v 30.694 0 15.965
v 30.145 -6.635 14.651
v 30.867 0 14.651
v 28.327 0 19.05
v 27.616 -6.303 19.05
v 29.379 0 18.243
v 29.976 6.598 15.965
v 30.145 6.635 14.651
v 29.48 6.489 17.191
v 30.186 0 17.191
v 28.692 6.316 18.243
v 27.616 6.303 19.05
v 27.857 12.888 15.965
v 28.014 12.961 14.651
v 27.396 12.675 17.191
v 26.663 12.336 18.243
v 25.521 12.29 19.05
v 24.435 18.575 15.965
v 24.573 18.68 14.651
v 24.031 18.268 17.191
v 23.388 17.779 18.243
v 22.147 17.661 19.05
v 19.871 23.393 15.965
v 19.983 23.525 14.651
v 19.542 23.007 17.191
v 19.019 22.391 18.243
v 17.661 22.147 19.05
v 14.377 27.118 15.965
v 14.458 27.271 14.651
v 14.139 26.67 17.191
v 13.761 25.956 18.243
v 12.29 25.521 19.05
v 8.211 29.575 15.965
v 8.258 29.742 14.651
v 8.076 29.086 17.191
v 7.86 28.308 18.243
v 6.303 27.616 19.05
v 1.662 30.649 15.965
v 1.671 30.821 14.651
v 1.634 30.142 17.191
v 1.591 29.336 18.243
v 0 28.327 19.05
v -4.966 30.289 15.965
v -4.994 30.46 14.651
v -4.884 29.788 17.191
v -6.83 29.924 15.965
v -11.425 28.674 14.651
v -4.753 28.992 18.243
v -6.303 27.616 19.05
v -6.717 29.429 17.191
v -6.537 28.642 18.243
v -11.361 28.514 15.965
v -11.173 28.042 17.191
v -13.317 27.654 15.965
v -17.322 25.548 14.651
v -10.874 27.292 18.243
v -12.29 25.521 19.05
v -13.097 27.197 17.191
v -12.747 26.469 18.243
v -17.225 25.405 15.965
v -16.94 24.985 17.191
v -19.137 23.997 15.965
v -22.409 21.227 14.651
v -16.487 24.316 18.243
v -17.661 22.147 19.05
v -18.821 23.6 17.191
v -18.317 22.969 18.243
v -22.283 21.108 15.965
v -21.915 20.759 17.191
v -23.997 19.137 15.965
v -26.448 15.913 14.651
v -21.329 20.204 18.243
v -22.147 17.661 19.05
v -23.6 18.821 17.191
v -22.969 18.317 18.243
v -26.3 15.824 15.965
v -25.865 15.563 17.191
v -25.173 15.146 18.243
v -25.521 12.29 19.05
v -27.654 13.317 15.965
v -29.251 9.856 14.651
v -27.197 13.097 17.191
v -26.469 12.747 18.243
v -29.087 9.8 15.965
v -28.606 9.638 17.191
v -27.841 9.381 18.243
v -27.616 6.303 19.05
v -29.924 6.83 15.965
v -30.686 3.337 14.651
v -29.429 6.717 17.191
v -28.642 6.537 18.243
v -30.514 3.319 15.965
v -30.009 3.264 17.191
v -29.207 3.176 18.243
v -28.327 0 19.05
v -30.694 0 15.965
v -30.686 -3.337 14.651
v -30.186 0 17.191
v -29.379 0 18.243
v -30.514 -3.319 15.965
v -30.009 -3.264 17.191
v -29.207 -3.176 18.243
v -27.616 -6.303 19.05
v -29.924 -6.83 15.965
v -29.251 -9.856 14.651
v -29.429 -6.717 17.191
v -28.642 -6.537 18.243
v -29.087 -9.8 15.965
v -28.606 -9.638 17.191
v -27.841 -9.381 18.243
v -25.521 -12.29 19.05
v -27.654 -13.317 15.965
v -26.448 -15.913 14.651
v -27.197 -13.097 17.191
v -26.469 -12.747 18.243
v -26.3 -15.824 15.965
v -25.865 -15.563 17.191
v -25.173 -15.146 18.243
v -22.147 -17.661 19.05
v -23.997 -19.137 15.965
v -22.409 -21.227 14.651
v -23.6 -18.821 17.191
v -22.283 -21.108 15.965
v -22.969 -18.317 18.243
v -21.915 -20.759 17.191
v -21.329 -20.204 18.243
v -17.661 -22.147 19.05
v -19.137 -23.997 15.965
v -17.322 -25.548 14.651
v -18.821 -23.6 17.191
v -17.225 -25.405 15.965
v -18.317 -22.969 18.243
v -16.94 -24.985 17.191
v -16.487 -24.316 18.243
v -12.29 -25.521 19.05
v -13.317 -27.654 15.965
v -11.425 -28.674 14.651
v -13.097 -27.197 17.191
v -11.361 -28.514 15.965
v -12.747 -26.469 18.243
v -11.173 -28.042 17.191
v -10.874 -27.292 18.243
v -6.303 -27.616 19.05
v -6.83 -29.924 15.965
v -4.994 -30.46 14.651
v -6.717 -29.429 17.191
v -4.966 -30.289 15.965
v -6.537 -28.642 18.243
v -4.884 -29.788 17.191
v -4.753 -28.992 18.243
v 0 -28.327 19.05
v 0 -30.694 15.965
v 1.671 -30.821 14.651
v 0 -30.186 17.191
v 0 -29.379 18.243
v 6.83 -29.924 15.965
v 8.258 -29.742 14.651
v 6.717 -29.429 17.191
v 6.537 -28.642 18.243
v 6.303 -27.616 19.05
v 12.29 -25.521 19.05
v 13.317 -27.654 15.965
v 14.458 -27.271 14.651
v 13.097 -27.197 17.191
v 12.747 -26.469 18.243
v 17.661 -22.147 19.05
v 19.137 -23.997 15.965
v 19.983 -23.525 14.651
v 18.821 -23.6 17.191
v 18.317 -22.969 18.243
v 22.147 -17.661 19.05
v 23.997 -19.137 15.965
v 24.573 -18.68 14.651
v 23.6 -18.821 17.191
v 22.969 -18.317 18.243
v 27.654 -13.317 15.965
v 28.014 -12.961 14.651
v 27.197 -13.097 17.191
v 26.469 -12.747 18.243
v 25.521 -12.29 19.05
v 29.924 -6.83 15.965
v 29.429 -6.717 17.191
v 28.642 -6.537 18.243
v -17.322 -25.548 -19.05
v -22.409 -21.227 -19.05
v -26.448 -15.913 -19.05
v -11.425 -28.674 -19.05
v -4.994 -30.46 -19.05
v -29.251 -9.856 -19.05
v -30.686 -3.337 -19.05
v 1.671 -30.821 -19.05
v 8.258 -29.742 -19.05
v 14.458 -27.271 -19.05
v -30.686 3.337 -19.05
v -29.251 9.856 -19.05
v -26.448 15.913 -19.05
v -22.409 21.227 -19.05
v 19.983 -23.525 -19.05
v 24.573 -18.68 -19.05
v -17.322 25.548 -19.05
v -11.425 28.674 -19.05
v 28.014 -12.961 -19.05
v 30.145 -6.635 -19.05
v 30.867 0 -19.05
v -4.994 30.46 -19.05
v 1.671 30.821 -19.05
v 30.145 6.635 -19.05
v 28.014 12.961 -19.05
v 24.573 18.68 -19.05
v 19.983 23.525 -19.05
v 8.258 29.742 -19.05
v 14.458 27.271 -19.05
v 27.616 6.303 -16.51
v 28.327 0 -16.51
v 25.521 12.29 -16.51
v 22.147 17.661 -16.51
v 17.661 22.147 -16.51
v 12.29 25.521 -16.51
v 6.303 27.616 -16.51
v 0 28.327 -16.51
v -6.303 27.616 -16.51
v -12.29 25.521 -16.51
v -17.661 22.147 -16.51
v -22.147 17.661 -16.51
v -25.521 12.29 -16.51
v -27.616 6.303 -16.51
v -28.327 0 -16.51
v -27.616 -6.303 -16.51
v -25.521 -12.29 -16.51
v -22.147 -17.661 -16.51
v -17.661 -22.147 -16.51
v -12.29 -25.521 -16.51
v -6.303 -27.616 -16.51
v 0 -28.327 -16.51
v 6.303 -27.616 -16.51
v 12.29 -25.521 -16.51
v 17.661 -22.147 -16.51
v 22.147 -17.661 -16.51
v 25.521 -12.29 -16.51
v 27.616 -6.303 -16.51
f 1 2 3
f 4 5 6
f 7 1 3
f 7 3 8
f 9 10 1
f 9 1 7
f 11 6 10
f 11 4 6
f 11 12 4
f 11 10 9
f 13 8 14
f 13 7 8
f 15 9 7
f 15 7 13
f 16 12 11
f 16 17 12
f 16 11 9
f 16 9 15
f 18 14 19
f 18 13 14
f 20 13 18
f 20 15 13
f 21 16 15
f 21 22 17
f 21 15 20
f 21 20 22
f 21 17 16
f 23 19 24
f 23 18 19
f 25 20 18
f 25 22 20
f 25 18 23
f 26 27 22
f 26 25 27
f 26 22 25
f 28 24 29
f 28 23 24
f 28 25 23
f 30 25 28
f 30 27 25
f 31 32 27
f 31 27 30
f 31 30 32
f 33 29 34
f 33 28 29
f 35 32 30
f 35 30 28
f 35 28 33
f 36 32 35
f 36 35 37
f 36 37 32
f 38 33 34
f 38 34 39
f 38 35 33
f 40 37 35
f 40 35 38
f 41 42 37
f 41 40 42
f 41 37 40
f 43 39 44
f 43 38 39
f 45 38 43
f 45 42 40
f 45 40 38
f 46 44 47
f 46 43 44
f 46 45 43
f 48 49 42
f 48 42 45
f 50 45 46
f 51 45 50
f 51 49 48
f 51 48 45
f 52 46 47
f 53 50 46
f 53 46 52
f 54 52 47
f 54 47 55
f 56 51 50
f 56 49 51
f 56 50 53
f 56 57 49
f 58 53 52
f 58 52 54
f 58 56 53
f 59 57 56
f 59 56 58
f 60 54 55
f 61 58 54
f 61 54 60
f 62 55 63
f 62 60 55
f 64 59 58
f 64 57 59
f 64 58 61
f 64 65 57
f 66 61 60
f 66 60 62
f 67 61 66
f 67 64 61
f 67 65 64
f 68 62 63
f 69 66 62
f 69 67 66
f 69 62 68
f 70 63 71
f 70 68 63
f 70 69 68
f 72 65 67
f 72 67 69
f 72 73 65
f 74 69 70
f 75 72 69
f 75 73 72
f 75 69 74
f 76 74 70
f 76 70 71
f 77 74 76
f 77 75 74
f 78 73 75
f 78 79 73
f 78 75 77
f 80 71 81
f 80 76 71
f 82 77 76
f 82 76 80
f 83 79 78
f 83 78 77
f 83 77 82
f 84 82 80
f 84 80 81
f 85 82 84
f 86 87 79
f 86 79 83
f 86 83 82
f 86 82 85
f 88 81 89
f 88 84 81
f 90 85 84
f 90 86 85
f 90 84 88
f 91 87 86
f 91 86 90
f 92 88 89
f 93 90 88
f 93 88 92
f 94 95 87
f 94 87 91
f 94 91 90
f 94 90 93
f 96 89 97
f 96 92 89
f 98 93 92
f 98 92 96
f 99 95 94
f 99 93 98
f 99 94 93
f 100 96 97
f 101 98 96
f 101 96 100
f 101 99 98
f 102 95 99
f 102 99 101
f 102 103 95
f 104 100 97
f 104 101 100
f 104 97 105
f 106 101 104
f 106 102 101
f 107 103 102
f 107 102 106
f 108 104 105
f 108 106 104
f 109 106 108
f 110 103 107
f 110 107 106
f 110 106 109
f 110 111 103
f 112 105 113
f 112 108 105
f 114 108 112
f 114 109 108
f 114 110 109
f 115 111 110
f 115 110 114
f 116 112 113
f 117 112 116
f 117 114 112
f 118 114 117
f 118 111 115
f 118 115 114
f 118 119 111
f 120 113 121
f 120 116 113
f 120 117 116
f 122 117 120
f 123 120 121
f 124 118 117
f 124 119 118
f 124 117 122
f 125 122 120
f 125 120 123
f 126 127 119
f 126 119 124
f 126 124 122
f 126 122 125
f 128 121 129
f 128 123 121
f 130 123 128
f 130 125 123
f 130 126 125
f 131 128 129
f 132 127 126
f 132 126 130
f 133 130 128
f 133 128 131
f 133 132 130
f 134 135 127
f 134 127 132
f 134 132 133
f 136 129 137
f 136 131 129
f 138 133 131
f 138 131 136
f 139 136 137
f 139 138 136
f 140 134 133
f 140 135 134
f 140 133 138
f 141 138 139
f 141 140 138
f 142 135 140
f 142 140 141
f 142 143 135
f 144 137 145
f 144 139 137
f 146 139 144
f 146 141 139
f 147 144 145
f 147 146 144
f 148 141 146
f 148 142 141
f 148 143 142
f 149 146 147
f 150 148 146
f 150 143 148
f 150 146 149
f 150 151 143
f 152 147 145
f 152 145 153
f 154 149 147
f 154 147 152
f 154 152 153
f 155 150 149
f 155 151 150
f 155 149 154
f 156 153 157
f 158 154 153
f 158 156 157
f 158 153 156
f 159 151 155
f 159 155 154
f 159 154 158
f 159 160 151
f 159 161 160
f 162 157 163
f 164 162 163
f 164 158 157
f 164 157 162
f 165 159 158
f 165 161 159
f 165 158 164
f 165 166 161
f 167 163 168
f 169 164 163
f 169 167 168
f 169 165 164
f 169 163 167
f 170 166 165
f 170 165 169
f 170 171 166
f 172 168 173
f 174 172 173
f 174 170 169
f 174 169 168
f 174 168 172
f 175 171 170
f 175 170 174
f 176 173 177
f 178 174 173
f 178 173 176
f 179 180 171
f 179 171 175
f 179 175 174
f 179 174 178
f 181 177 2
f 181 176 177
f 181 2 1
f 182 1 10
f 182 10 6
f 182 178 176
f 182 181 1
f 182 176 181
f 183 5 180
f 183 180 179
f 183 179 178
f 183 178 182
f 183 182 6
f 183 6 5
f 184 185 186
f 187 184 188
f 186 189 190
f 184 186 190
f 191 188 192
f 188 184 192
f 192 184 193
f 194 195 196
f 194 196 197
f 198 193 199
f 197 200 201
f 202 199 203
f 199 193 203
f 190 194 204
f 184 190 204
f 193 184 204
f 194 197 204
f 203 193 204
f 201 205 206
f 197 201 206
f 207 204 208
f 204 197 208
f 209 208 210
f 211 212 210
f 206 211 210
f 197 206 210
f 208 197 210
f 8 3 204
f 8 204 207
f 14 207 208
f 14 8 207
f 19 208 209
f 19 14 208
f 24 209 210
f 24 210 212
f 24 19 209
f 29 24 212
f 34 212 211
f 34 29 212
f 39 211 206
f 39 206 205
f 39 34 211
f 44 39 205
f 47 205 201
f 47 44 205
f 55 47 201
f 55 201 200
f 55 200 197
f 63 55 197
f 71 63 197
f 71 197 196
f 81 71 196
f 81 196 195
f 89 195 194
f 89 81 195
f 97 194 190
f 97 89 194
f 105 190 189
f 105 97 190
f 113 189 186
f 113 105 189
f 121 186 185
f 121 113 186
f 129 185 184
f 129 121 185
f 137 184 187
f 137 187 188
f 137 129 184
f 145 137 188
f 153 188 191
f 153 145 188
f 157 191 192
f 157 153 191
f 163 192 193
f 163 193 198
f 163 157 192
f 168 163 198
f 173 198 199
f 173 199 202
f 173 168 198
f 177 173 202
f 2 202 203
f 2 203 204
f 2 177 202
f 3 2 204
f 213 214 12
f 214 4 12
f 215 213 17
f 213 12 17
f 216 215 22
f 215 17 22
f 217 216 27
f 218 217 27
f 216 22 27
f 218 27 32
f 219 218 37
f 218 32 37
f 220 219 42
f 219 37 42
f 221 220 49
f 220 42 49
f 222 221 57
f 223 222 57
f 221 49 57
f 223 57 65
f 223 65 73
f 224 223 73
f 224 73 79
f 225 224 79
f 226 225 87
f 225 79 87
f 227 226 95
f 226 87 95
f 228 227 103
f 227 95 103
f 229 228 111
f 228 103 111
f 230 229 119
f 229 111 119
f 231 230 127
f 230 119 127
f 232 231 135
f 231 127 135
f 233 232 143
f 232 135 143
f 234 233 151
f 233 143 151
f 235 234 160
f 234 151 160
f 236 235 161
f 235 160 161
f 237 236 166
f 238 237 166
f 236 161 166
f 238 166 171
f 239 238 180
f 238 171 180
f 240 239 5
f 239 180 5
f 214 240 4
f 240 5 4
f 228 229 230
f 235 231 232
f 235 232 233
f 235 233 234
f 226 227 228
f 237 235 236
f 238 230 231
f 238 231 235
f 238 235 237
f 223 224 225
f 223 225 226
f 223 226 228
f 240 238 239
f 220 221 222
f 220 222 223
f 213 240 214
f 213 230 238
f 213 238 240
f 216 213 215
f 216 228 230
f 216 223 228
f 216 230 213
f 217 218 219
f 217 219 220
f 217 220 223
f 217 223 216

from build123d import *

# Parameters (mm, degrees)
F0_R     = 30.8666383599
F1_DEPTH = 19.05
F2_T     = -2.54


# Not quite as in the source:
# - a fillet or chamfer that OpenCascade refuses, or shapes differently, is made with other operations: its cross-section is extruded or revolved along the edge and cut away or added


with BuildPart() as f1:
    # F0 (on Top) → F1 (new body, symmetric)
    with BuildSketch(Plane.XY):
        Circle(F0_R)
    extrude(amount=F1_DEPTH, both=True)

    # F2
    f2_openings = [f1.faces().sort_by_distance(p)[0] for p in [
        (0, 0, 19.05),
    ]]
    offset(amount=F2_T, openings=f2_openings)

    # F3: fillet of radius 5.08 on 1 edges, made by hand

    # F3_s1 → F3_t2 (revolve, cut)
    with BuildSketch(Plane.XZ):
        with BuildLine():
            ThreePointArc((30.8666383599, 14.6505909488), (30.1860474111, 17.1905909488), (28.3266383599, 19.05))
            Line((28.3266383599, 19.05), (28.3774383599, 19.137988181))
            ThreePointArc((28.3774383599, 19.137988181), (29.5966383599, 19.1516), (30.8666383599, 19.1516))
            Line((30.8666383599, 19.1516), (30.9682383599, 19.05))
            Line((30.9682383599, 19.05), (30.9682383599, 14.6505909488))
            Line((30.9682383599, 14.6505909488), (30.8666383599, 14.6505909488))
        make_face()
    revolve(axis=Axis((0, 0, 19.05), (0, 0, 1)), mode=Mode.SUBTRACT)


solid = f1.part
